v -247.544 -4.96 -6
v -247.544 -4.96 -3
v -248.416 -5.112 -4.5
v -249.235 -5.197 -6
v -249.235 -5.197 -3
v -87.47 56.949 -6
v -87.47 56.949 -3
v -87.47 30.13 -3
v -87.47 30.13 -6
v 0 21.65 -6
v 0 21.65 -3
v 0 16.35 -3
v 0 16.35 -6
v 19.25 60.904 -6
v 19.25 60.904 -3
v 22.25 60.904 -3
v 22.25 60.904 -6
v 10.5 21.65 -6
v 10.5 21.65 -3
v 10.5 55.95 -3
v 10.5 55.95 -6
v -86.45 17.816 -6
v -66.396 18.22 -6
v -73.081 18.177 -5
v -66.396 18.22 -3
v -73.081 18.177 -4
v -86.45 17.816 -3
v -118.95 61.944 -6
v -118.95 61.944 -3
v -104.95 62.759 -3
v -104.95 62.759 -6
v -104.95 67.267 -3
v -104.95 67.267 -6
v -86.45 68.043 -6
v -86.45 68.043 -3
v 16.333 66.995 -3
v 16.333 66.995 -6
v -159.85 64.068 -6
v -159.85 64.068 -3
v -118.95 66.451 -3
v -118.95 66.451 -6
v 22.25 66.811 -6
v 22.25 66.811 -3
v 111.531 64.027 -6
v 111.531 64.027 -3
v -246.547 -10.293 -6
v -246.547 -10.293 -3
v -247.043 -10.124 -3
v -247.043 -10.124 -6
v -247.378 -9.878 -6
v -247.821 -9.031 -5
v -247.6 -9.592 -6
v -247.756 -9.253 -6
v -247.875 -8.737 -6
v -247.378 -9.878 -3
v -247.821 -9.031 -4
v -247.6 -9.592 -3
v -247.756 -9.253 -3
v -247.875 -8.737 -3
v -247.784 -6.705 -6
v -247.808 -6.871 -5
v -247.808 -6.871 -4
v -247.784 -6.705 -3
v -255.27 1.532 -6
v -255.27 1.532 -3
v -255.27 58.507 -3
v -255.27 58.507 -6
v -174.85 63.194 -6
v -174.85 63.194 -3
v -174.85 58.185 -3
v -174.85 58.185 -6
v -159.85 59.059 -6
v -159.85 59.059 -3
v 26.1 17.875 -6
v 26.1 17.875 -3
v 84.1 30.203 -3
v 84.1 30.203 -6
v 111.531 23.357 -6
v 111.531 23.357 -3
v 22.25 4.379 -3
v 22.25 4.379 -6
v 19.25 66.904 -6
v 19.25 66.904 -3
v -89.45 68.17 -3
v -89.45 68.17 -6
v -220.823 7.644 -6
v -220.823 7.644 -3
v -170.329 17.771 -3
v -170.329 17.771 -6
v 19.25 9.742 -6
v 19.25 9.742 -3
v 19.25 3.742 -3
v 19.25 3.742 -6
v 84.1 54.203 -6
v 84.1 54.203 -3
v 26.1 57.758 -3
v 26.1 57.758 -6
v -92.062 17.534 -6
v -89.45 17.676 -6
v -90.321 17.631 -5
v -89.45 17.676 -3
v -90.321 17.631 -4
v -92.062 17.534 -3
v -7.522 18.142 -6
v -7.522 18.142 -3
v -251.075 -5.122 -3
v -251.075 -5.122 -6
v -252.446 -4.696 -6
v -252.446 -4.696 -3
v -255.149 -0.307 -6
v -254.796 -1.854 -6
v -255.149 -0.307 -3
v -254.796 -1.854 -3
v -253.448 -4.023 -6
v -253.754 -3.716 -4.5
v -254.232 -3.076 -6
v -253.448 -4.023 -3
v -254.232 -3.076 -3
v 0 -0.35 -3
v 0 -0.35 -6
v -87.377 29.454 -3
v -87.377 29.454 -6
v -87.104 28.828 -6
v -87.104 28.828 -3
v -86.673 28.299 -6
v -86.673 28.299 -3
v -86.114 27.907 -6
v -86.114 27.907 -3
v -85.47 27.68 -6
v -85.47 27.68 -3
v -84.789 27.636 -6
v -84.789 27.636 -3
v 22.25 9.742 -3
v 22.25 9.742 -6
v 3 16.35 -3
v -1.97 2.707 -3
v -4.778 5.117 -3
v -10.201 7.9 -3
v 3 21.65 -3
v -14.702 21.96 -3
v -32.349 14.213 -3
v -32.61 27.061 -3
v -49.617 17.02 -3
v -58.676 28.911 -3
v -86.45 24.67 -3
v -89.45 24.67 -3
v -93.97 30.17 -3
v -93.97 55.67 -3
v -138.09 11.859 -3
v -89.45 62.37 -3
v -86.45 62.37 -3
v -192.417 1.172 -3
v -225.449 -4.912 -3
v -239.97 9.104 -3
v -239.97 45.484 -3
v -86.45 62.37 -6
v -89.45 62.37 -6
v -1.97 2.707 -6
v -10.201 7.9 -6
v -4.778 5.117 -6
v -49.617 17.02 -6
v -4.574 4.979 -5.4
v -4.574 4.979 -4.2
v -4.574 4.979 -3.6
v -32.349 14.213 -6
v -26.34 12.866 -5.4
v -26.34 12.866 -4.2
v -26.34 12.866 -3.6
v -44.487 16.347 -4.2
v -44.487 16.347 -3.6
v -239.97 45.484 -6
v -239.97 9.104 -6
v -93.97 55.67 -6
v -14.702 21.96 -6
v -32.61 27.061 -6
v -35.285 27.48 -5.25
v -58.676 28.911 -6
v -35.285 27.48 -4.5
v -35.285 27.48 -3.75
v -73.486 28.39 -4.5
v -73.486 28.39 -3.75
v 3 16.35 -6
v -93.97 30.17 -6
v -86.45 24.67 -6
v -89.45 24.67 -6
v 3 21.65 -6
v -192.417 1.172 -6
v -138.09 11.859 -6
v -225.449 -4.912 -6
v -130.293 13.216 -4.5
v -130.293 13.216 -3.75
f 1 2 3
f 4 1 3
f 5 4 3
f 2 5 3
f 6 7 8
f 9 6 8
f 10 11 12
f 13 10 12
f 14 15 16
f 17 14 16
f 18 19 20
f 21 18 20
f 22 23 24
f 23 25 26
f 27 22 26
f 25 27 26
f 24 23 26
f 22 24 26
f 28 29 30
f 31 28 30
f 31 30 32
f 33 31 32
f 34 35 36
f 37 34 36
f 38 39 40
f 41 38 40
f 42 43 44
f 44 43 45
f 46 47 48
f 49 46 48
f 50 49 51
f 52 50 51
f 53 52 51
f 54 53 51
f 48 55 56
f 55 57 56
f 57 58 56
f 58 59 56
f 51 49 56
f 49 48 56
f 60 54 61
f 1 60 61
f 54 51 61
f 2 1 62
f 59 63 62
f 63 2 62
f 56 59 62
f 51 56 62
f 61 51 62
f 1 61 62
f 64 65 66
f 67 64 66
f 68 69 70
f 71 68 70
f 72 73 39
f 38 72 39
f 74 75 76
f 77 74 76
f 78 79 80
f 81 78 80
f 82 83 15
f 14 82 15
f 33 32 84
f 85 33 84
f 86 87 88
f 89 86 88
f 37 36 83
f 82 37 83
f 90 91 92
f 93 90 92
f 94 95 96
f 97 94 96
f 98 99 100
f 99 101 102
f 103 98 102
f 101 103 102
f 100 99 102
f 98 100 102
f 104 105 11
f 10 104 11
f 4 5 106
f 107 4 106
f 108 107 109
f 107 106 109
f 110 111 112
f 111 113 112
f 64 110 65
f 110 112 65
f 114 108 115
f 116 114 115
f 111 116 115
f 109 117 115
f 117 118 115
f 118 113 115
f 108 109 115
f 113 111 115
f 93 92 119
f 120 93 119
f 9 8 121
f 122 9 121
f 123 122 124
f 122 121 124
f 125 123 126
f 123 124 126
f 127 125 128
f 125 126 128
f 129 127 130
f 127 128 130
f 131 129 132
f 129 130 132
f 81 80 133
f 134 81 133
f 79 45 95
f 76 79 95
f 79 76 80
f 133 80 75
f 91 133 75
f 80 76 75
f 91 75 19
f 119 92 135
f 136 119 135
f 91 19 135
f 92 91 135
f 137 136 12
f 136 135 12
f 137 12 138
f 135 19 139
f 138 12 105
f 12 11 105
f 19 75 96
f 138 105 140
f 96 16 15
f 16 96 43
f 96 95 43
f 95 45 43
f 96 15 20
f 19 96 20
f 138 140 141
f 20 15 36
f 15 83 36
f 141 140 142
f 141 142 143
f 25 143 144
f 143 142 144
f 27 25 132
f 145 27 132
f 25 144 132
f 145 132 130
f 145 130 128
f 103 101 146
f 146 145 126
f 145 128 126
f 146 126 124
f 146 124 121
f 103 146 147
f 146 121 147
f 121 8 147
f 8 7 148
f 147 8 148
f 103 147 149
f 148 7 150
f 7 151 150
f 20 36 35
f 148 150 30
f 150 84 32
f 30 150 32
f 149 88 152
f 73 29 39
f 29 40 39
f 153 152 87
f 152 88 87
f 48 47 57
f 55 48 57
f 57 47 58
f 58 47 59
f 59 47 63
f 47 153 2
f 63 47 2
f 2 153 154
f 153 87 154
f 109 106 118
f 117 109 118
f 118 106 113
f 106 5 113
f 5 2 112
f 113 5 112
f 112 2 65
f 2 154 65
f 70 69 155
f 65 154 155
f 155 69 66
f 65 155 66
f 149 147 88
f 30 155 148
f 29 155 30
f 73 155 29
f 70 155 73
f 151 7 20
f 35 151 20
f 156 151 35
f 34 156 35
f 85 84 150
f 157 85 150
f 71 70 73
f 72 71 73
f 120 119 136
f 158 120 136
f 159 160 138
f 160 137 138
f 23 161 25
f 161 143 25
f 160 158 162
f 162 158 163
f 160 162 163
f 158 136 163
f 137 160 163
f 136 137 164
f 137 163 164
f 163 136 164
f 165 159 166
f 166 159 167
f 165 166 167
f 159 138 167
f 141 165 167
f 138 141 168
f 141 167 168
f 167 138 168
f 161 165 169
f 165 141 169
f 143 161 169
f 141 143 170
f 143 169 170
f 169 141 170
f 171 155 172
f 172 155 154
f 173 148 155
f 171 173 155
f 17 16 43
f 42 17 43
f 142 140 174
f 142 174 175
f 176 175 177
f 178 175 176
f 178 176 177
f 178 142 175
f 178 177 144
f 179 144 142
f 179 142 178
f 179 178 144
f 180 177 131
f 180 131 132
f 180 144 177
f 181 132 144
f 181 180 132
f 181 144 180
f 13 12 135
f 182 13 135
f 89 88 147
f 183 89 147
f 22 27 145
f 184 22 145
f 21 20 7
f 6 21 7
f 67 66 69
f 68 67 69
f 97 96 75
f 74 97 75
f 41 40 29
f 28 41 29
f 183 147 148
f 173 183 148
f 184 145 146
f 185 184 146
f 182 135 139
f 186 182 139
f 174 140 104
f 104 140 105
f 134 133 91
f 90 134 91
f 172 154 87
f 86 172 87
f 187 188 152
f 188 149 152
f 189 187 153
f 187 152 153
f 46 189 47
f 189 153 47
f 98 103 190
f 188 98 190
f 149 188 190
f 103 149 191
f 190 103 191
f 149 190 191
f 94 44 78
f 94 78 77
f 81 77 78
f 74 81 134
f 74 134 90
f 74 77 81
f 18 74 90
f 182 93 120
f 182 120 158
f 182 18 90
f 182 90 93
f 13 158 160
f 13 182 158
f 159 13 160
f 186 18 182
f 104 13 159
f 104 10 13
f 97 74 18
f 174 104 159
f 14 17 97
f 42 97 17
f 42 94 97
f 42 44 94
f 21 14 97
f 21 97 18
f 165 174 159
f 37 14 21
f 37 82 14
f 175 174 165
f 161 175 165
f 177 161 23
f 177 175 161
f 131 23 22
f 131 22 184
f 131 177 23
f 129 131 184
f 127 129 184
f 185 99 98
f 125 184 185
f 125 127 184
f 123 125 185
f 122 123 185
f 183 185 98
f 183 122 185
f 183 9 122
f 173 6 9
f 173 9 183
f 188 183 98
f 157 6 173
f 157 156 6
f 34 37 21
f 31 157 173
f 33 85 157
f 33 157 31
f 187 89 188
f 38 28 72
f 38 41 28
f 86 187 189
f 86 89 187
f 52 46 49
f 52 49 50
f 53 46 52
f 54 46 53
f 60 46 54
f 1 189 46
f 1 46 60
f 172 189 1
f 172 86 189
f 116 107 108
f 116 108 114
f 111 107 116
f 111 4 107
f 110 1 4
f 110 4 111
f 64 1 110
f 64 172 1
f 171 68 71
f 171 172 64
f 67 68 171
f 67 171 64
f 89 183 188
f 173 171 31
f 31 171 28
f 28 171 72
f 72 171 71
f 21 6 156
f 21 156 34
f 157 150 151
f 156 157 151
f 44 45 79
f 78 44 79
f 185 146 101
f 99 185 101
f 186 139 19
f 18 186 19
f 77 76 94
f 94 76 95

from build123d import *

# Parameters (mm, degrees)
BOSS_EXTRUDE2_DEPTH = 3


with BuildPart() as part:
    # Sketch6 → Boss-Extrude2 (new body)
    with BuildSketch(Plane(origin=(0, 0, -3), x_dir=(-1, 0, 0), z_dir=(0, 0, -1))):
        with BuildLine():
            Line((-19.25, 3.741713812), (0, -0.35))
            add(Edge.make_bspline(
                [(0, -0.35), (3.178862469, 6.495343287), (8.987756305, 8.032168144), (22.140633739, 13.071207305), (43.250433247, 17.69324185), (66.39602757, 18.219905629)],
                knots=[0, 0, 0, 0, 0, 0, 1, 1, 1, 1, 1, 1], degree=5))
            add(Edge.make_bspline(
                [(66.39602757, 18.219905629), (73.079858249, 18.217137873), (79.768873399, 18.101745103), (86.45, 17.815976098)],
                knots=[0.875945967, 0.875945967, 0.875945967, 0.875945967, 0.985673704, 0.985673704, 0.985673704, 0.985673704], degree=3))
            Line((86.45, 17.815976098), (86.45, 24.670250599))
            Line((86.45, 24.670250599), (89.45, 24.670250599))
            Line((89.45, 24.670250599), (89.45, 17.675984992))
            add(Edge.make_bspline(
                [(89.45, 17.675984992), (90.320899947, 17.631898595), (91.191632468, 17.584767892), (92.062168571, 17.534464817)],
                knots=[1.002100386, 1.002100386, 1.002100386, 1.002100386, 1.01640933, 1.01640933, 1.01640933, 1.01640933], degree=3))
            add(Edge.make_bspline(
                [(92.062168571, 17.534464817), (95.665977641, 17.334138157), (108.464938821, 16.428798519), (140.620964858, 12.117510077), (188.11962528, 1.017487261), (227.440155367, -4.385412225), (246.547152618, -10.292650589)],
                knots=[0, 0, 0, 0, 0.05922822, 0.210539222, 0.531730365, 0.859536637, 0.859536637, 0.859536637, 0.859536637], degree=3))
            add(Edge.make_bspline(
                [(246.547152618, -10.292650589), (248.808777451, -9.863624592), (247.588252624, -6.363600679), (247.543685046, -4.960441529)],
                knots=[0, 0, 0, 0, 1, 1, 1, 1], degree=3))
            add(Edge.make_bspline(
                [(247.543685046, -4.960441529), (248.441640739, -5.14429555), (249.235236144, -5.197240659)],
                knots=[0, 0, 0, 0.116478493, 0.116478493, 0.116478493], degree=2))
            add(Edge.make_bspline(
                [(249.235236144, -5.197240659), (255.254876243, -5.598843915), (255.27, 1.531581744)],
                knots=[0.116478493, 0.116478493, 0.116478493, 1, 1, 1], degree=2))
            Line((255.27, 1.531581744), (255.27, 58.507349411))
            Line((255.27, 58.507349411), (174.85, 63.193699149))
            Line((174.85, 63.193699149), (174.85, 58.185216861))
            Line((174.85, 58.185216861), (159.85, 59.059318403))
            Line((159.85, 59.059318403), (159.85, 64.067800692))
            Line((159.85, 64.067800692), (118.95, 66.451184232))
            Line((118.95, 66.451184232), (118.95, 61.943550172))
            Line((118.95, 61.943550172), (104.95, 62.759378279))
            Line((104.95, 62.759378279), (104.95, 67.267012338))
            Line((104.95, 67.267012338), (89.45, 68.170250599))
            Line((89.45, 68.170250599), (89.45, 62.370250599))
            Line((89.45, 62.370250599), (86.45, 62.370250599))
            Line((86.45, 62.370250599), (86.45, 68.043292799))
            Line((86.45, 68.043292799), (-16.333378442, 66.994986377))
            Line((-16.333378442, 66.994986377), (-19.25, 66.904044127))
            Line((-19.25, 66.904044127), (-19.25, 60.904044127))
            Line((-19.25, 60.904044127), (-22.25, 60.904044127))
            Line((-22.25, 60.904044127), (-22.25, 66.810502081))
            Line((-22.25, 66.810502081), (-111.531056313, 64.026657849))
            Line((-111.531056313, 64.026657849), (-111.531056313, 23.356657849))
            Line((-111.531056313, 23.356657849), (-22.25, 4.379383497))
            Line((-22.25, 4.379383497), (-22.25, 9.741713812))
            Line((-22.25, 9.741713812), (-19.25, 9.741713812))
            Line((-19.25, 9.741713812), (-19.25, 3.741713812))
        make_face()
        Polygon((-84.1, 54.203030213), (-26.1, 57.75847956), (-26.1, 17.874749636), (-84.1, 30.203030213), align=None, mode=Mode.SUBTRACT)
        with BuildLine():
            Line((-10.5, 21.65), (-10.5, 55.95))
            Line((-10.5, 55.95), (87.47, 56.949213898))
            Line((87.47, 56.949213898), (87.47, 30.129694509))
            ThreePointArc((87.47, 30.129694509), (86.67270256, 28.299174366), (84.789356805, 27.636229443))
            add(Edge.make_bspline(
                [(14.701665666, 21.959575817), (21.19900444, 24.808951329), (34.471850374, 27.925627057), (54.295468051, 29.219545771), (70.832055402, 28.62299092), (81.026620283, 27.908827105), (84.789356805, 27.636229443)],
                knots=[0.099500985, 0.099500985, 0.099500985, 0.099500985, 0.360279093, 0.592189537, 0.828480504, 0.96707438, 0.96707438, 0.96707438, 0.96707438], degree=3))
            Line((14.701665666, 21.959575817), (7.522354632, 18.142268428))
            Line((7.522354632, 18.142268428), (0, 21.65))
            Line((0, 21.65), (0, 16.35))
            Line((0, 16.35), (-3, 16.35))
            Line((-3, 16.35), (-3, 21.65))
            Line((-3, 21.65), (-10.5, 21.65))
        make_face(mode=Mode.SUBTRACT)
        Polygon((93.97, 30.170250599), (93.97, 55.670250599), (239.97, 45.483901662), (239.97, 9.104044127), (220.823057098, 7.643571), (170.32923345, 17.7710139), align=None, mode=Mode.SUBTRACT)
    extrude(amount=BOSS_EXTRUDE2_DEPTH)


solid = part.part
